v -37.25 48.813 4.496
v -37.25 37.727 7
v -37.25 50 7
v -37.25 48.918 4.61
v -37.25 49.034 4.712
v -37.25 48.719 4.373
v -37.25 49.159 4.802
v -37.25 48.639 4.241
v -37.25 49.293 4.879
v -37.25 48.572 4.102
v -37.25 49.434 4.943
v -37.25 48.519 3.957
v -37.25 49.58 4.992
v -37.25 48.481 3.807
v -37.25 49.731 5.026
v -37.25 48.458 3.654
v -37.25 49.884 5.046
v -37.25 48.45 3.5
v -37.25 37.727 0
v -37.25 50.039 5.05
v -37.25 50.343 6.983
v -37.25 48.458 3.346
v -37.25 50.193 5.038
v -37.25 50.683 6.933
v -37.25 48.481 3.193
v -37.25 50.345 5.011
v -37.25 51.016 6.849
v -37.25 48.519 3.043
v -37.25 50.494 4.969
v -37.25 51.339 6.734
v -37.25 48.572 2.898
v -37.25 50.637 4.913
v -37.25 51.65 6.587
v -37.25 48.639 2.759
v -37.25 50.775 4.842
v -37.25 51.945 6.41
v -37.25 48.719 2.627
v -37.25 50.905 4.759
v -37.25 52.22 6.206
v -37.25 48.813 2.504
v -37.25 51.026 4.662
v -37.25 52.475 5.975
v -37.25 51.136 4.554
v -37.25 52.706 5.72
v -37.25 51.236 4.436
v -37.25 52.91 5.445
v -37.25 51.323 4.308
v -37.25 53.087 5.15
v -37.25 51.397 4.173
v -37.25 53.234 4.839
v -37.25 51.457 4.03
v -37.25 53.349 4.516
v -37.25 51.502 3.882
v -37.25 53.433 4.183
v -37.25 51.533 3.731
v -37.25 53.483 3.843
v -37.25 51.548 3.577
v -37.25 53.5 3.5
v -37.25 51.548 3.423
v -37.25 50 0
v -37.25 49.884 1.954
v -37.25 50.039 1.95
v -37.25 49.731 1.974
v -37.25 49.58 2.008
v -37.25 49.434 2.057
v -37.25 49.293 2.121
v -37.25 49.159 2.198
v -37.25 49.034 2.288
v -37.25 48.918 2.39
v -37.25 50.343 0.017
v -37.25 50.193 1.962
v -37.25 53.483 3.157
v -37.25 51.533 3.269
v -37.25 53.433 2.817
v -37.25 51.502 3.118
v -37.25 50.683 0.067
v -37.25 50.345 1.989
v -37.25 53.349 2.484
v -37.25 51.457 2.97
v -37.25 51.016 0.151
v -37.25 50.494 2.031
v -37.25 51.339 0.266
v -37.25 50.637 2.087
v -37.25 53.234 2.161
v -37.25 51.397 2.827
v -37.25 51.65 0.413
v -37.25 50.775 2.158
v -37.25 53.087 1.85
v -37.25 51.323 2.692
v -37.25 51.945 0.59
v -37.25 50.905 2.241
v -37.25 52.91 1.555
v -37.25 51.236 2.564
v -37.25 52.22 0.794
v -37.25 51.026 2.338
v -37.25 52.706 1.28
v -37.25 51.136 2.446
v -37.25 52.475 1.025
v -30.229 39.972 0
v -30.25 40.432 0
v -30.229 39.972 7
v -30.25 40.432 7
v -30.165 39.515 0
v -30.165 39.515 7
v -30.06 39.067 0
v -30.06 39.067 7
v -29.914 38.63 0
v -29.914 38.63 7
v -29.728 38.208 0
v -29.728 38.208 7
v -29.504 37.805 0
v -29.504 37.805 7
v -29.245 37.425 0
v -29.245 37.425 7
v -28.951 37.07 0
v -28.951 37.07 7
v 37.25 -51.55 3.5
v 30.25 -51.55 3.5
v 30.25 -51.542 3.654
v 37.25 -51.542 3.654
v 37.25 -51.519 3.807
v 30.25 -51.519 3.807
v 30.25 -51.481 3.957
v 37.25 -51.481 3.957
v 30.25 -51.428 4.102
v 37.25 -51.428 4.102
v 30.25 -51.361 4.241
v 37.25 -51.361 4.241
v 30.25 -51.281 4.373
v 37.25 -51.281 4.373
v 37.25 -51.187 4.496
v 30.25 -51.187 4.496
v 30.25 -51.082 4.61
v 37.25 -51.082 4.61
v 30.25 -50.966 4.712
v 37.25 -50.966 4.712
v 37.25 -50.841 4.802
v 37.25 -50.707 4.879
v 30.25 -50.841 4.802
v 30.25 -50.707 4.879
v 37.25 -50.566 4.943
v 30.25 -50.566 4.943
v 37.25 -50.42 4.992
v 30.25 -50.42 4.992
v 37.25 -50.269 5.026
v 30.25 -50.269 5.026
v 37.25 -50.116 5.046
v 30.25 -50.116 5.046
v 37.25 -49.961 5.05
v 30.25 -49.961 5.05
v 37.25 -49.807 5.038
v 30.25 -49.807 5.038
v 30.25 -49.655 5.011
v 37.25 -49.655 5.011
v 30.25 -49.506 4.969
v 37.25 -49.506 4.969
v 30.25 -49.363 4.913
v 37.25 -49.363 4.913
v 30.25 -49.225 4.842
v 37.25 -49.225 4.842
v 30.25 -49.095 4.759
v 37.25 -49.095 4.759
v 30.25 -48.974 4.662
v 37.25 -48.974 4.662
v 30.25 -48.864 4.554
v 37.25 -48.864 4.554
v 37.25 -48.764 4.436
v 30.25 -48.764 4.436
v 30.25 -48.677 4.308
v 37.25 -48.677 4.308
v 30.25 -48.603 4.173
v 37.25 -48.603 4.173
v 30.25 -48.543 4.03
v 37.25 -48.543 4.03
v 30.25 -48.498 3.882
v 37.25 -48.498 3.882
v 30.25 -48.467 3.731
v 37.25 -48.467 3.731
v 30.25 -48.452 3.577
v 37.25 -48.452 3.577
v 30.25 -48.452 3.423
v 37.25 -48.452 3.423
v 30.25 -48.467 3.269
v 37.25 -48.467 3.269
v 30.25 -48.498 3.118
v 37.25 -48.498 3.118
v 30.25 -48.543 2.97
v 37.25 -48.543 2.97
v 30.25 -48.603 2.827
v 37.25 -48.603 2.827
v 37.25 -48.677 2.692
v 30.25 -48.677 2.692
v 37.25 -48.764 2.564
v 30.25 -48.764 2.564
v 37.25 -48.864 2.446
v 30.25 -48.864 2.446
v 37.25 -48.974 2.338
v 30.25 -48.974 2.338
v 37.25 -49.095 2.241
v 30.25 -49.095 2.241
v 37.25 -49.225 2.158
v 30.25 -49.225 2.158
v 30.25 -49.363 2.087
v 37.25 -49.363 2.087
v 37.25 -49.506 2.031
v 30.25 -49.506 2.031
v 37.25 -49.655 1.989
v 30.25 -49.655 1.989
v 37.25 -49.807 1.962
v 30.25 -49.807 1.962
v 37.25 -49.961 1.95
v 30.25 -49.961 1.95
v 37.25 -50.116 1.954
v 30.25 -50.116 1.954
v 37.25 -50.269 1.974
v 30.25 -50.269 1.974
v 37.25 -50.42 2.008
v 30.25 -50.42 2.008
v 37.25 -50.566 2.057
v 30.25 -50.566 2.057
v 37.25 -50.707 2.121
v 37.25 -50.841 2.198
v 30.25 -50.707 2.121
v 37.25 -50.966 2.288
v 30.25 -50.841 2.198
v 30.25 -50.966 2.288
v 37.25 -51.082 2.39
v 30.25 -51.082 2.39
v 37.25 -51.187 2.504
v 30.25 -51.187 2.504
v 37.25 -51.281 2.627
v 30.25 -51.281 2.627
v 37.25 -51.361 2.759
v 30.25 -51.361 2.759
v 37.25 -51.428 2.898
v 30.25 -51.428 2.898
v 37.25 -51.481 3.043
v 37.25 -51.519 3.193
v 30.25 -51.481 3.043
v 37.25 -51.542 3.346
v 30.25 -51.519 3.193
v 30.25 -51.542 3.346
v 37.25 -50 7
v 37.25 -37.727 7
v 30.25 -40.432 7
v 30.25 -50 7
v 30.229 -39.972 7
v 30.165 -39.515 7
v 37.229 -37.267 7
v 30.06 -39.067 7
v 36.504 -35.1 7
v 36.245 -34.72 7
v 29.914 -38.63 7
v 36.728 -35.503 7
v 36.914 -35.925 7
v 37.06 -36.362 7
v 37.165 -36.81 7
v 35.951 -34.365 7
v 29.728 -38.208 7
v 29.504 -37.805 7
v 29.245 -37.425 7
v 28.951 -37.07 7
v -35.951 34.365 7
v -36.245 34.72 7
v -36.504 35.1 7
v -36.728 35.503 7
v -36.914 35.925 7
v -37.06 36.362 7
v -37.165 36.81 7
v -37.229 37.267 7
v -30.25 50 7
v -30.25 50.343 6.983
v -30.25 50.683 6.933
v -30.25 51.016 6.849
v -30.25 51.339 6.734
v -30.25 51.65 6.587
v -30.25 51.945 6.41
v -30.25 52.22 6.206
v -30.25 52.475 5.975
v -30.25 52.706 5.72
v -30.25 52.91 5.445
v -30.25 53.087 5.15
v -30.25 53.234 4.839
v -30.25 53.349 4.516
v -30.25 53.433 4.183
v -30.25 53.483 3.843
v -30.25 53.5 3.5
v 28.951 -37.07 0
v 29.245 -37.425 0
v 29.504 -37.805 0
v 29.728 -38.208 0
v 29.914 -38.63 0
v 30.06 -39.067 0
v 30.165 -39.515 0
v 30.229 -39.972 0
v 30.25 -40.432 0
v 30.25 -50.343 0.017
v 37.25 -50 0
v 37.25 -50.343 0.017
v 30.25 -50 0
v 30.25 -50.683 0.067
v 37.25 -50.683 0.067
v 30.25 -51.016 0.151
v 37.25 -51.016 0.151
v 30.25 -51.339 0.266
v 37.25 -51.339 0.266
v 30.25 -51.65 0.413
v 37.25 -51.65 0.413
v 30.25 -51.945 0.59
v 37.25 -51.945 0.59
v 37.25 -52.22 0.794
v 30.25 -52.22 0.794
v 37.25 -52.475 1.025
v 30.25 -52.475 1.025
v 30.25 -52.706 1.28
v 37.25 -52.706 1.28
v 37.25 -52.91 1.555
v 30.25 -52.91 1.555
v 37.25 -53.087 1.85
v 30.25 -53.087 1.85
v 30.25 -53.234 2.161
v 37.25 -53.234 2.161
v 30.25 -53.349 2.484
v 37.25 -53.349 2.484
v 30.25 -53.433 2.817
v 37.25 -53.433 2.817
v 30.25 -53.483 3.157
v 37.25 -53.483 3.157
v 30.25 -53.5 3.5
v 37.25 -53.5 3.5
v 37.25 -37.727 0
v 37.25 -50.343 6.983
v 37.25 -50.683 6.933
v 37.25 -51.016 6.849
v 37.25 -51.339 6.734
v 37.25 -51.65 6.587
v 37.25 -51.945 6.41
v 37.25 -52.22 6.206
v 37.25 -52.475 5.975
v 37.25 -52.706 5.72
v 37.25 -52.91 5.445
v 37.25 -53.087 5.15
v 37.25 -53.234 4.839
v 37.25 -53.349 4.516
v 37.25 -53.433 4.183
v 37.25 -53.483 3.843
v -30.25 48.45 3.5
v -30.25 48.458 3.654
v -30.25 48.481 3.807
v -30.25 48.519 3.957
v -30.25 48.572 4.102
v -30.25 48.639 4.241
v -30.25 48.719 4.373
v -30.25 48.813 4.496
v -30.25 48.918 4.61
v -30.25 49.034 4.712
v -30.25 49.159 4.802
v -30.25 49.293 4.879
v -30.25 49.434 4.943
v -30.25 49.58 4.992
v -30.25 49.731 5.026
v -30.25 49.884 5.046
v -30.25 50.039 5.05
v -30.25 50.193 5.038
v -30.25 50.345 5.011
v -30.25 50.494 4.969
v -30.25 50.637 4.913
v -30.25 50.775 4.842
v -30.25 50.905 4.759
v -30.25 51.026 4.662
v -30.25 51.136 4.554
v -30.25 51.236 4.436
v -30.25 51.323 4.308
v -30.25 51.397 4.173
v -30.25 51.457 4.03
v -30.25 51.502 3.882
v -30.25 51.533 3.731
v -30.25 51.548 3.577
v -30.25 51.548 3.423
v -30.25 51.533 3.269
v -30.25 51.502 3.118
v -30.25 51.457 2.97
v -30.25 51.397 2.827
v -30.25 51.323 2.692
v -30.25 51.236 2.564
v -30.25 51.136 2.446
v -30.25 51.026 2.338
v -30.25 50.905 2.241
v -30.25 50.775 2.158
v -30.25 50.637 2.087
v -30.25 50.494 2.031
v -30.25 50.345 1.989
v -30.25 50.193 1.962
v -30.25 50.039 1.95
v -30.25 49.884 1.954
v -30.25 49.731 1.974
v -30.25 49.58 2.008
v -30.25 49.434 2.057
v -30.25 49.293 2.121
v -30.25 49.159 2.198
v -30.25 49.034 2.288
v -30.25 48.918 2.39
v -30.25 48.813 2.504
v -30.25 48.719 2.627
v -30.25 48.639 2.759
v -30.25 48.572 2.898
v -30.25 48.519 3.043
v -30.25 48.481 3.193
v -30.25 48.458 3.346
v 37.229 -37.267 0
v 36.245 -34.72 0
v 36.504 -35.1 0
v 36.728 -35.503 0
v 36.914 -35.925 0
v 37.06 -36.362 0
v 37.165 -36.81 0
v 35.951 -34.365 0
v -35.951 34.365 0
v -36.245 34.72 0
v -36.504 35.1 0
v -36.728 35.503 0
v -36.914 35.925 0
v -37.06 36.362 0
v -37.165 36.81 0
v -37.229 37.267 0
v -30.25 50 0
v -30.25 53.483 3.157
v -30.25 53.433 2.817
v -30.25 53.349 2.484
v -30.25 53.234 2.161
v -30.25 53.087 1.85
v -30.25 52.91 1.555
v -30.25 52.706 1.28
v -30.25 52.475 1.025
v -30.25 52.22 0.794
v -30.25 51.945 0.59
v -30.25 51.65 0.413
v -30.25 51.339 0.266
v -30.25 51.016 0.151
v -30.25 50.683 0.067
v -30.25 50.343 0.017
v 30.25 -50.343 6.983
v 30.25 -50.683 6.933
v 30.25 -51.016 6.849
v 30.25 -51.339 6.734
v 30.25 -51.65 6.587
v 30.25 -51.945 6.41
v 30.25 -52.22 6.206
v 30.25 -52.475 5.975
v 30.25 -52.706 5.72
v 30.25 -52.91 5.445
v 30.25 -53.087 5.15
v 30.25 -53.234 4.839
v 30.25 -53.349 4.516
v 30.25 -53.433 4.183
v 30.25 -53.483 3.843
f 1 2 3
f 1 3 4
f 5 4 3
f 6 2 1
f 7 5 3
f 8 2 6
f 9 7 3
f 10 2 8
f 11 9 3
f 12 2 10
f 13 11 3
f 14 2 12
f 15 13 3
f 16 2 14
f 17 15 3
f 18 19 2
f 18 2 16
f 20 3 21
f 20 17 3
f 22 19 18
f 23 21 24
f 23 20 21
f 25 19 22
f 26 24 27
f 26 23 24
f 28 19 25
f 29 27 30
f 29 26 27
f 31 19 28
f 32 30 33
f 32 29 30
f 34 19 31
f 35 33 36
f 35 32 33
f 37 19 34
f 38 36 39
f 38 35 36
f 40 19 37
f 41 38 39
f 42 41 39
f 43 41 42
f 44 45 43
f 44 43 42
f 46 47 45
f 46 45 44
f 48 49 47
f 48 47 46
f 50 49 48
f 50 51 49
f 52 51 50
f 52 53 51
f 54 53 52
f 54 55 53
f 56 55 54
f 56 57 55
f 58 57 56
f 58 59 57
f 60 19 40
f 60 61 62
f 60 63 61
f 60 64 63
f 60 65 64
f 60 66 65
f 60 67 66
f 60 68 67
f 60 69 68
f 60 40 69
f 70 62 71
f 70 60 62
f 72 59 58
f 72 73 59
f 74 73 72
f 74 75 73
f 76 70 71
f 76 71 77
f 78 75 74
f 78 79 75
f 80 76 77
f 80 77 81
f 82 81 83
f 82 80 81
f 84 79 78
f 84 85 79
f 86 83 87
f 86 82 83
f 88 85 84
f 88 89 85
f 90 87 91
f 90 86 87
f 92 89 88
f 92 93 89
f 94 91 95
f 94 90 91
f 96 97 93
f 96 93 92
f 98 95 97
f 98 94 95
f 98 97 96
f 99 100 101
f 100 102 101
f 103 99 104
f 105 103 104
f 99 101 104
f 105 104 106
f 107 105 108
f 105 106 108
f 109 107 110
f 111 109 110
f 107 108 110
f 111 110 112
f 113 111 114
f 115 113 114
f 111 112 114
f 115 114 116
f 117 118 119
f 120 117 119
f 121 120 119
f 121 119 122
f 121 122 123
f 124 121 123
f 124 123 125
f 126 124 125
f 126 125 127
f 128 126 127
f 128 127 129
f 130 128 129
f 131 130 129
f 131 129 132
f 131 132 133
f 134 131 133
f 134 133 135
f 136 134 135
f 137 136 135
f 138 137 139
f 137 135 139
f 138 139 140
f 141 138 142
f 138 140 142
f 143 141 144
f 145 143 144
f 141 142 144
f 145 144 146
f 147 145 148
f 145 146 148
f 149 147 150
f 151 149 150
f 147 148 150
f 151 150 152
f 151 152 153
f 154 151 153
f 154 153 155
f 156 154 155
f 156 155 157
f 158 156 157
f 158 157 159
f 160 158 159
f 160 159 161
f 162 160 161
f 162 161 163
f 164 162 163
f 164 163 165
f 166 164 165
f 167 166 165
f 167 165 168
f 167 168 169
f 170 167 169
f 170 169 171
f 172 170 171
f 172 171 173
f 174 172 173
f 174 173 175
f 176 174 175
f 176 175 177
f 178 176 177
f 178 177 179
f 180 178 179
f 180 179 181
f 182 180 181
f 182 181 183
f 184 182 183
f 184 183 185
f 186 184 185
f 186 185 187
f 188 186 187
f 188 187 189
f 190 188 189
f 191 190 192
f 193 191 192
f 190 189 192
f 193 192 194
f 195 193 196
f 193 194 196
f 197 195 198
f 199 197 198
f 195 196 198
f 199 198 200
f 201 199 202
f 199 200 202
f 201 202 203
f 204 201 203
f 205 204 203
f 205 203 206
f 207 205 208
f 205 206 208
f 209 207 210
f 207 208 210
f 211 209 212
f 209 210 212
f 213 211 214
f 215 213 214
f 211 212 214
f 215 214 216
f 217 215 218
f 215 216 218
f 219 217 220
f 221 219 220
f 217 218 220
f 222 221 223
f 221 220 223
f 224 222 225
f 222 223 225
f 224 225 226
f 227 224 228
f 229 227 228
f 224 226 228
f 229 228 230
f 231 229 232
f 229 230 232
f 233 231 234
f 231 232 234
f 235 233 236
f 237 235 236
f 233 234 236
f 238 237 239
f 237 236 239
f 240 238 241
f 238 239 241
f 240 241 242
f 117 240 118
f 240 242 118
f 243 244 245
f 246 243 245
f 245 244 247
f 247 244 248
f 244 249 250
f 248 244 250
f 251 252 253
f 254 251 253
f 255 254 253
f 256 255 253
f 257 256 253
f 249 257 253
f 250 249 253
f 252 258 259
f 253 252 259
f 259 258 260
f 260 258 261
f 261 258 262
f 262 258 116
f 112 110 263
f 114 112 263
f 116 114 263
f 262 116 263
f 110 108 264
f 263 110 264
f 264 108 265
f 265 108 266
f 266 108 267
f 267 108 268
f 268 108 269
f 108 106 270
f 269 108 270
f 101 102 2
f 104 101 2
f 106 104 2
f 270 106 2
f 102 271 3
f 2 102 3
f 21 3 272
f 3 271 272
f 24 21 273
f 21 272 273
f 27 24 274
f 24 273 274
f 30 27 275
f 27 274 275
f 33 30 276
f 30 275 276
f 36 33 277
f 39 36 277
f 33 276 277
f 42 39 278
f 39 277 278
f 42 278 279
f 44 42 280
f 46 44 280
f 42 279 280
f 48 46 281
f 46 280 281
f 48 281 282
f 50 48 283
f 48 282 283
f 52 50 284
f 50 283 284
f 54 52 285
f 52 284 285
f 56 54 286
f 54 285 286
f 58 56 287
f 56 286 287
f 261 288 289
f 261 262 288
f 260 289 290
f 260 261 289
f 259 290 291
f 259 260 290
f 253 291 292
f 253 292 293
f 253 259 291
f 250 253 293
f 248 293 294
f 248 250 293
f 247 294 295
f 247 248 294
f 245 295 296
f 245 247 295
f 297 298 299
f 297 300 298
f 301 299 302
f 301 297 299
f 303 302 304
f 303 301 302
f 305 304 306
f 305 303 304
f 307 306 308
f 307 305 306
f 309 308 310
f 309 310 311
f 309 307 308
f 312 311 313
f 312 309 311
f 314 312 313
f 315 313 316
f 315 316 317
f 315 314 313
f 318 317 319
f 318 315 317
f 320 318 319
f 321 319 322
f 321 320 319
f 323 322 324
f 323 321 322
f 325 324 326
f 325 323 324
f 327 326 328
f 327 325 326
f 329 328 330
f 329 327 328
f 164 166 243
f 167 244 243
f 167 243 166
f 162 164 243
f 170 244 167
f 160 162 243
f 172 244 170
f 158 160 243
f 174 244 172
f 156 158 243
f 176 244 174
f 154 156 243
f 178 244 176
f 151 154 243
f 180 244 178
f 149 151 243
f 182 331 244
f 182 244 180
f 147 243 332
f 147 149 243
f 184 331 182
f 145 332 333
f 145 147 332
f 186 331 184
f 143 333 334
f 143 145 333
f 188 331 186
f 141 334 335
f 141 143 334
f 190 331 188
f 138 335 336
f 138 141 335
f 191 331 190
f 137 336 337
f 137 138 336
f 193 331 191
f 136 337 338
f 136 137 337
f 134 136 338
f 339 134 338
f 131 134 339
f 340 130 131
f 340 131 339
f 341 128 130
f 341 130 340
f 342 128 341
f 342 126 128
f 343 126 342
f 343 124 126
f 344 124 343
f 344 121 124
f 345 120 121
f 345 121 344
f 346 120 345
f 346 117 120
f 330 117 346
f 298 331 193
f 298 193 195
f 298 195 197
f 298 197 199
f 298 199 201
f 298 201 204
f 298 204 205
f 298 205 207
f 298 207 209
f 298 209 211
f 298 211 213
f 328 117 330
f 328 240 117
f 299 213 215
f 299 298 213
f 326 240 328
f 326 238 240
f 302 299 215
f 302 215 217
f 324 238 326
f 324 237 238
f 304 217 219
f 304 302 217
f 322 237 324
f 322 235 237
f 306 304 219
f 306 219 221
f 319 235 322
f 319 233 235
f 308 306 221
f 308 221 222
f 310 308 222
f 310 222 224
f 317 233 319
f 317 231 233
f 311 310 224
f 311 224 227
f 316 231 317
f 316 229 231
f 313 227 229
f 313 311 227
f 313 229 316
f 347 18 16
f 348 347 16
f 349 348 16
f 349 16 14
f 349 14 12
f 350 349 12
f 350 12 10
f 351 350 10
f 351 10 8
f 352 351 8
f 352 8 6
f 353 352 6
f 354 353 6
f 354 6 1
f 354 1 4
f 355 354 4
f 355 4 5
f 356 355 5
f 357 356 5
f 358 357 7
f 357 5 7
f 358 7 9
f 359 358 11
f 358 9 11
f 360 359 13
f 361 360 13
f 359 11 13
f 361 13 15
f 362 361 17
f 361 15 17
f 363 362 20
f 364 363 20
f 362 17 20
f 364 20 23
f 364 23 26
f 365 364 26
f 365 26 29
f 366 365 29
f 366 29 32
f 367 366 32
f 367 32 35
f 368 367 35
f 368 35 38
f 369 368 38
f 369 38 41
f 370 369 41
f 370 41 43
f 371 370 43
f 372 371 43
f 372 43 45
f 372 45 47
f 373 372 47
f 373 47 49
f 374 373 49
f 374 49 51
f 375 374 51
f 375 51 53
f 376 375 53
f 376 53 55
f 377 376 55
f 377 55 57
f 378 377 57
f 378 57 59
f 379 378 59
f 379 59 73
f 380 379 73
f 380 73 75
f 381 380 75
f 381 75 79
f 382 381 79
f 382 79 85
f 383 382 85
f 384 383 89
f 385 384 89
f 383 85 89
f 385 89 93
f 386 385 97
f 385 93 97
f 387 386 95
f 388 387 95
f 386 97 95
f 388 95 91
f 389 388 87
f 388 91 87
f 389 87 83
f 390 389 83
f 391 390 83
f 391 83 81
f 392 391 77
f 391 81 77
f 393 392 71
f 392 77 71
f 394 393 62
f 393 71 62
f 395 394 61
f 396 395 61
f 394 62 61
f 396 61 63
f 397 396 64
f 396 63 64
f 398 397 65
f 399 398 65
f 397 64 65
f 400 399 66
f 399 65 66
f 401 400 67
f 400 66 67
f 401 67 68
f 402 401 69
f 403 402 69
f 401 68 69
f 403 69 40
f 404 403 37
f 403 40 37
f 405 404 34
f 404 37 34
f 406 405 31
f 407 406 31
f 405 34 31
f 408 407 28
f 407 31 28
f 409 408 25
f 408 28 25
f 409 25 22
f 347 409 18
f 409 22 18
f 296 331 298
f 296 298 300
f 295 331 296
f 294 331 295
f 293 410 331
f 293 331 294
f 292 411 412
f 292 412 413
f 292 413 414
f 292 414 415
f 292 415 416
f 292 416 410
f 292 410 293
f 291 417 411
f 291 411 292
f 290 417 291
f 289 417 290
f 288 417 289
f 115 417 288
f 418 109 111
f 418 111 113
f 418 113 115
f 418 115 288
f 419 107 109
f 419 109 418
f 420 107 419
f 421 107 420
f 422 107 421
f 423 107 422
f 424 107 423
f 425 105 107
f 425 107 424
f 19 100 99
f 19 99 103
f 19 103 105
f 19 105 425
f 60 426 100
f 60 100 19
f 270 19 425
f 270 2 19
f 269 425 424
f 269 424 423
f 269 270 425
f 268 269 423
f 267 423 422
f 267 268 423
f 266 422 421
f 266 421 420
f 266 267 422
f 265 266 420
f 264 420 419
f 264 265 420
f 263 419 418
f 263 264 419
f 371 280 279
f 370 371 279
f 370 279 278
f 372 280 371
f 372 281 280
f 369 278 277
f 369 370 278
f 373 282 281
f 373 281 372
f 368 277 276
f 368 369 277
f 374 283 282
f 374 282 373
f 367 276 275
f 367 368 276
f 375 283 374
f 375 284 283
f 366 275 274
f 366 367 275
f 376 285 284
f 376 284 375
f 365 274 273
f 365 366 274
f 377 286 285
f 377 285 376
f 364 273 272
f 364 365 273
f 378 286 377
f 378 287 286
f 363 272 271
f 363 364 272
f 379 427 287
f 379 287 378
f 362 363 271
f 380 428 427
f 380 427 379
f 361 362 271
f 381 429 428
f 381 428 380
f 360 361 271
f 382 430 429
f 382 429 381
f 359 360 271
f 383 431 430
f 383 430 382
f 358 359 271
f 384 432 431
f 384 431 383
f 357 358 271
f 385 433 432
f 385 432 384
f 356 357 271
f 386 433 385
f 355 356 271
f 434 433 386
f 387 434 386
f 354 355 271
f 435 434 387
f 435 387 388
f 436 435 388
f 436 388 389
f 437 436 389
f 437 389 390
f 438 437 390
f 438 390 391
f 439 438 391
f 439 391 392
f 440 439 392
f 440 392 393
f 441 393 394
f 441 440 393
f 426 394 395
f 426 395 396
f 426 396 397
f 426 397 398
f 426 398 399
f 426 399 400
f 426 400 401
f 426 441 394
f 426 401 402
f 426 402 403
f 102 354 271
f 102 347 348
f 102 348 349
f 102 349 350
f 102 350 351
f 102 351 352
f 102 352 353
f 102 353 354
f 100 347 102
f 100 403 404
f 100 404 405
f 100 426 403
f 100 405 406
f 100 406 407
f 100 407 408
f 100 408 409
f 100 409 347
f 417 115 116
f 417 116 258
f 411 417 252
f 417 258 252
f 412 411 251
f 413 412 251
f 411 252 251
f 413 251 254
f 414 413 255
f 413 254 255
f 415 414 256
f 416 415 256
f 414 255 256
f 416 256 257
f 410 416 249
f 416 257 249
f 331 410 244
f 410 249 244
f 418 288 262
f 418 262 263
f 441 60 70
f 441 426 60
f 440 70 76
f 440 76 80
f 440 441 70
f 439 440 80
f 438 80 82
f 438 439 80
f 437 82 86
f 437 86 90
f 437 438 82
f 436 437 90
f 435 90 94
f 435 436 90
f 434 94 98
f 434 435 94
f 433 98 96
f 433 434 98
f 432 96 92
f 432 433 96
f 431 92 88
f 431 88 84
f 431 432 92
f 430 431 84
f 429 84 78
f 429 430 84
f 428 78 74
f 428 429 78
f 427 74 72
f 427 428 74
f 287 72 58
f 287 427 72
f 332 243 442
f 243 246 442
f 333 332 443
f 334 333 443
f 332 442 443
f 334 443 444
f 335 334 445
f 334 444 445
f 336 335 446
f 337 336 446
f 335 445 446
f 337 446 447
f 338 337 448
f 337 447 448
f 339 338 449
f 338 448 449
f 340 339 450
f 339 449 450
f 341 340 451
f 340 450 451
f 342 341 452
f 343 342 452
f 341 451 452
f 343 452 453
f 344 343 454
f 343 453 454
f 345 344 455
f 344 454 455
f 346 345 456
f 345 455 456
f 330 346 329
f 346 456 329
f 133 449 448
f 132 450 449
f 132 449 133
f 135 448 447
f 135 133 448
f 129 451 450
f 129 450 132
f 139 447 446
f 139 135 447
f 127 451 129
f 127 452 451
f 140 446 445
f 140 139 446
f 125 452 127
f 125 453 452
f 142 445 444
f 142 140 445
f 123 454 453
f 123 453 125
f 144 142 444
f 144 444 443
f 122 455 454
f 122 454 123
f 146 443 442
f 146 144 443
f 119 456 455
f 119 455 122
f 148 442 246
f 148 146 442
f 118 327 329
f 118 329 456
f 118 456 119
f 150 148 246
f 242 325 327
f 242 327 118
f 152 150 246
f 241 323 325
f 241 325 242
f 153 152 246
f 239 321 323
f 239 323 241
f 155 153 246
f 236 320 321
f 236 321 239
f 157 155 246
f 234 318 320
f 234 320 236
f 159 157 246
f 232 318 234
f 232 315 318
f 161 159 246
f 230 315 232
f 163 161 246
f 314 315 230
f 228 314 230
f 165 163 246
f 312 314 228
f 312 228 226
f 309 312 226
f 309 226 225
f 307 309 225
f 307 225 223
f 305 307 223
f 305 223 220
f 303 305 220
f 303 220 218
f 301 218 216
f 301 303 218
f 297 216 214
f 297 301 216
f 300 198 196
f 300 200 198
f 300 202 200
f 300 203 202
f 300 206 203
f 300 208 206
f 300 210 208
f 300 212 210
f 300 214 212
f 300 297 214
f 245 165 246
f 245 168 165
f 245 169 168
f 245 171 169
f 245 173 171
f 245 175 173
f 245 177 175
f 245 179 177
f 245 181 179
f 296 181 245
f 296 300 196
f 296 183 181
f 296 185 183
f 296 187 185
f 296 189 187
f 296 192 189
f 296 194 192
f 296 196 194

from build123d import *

# Parameters (mm, degrees)
PAD_DEPTH    = 7
SKETCH001_R  = 1.55
POCKET_DEPTH = 74.501
FILLET_R     = 3.4999
FILLET001_R  = 5


with BuildPart() as part:
    # Sketch → Pad (new body)
    with BuildSketch(Plane.XY):
        Polygon((-37.25, 35.794964), (-37.25, 53.5), (-30.25, 53.5), (-30.25, 38.5), (37.25, -35.794964), (37.25, -53.5), (30.25, -53.5), (30.25, -38.5), align=None)
    extrude(amount=PAD_DEPTH)

    # Sketch001 (on Face1 of Pad) → Pocket (cut, through all)
    with BuildSketch(Plane(origin=(-37.25, 0, 0), x_dir=(0, -1, 0), z_dir=(-1, 0, 0))):
        with Locations((-50, 3.5)):
            Circle(SKETCH001_R)
        with Locations((50, 3.5)):
            Circle(SKETCH001_R)
    extrude(amount=-POCKET_DEPTH, mode=Mode.SUBTRACT)

    # Fillet
    fillet_edges = [part.edges().sort_by_distance(p)[0] for p in [
        (-33.75, 53.5, 7),
        (-33.75, 53.5, 0),
        (33.75, -53.5, 0),
        (33.75, -53.5, 7),
    ]]
    fillet(fillet_edges, radius=FILLET_R)

    # Fillet001
    fillet001_edges = [part.edges().sort_by_distance(p)[0] for p in [
        (37.25, -35.794964, 3.5),
        (-30.25, 38.5, 3.5),
        (30.25, -38.5, 3.5),
        (-37.25, 35.794964, 3.5),
    ]]
    fillet(fillet001_edges, radius=FILLET001_R)


solid = part.part
